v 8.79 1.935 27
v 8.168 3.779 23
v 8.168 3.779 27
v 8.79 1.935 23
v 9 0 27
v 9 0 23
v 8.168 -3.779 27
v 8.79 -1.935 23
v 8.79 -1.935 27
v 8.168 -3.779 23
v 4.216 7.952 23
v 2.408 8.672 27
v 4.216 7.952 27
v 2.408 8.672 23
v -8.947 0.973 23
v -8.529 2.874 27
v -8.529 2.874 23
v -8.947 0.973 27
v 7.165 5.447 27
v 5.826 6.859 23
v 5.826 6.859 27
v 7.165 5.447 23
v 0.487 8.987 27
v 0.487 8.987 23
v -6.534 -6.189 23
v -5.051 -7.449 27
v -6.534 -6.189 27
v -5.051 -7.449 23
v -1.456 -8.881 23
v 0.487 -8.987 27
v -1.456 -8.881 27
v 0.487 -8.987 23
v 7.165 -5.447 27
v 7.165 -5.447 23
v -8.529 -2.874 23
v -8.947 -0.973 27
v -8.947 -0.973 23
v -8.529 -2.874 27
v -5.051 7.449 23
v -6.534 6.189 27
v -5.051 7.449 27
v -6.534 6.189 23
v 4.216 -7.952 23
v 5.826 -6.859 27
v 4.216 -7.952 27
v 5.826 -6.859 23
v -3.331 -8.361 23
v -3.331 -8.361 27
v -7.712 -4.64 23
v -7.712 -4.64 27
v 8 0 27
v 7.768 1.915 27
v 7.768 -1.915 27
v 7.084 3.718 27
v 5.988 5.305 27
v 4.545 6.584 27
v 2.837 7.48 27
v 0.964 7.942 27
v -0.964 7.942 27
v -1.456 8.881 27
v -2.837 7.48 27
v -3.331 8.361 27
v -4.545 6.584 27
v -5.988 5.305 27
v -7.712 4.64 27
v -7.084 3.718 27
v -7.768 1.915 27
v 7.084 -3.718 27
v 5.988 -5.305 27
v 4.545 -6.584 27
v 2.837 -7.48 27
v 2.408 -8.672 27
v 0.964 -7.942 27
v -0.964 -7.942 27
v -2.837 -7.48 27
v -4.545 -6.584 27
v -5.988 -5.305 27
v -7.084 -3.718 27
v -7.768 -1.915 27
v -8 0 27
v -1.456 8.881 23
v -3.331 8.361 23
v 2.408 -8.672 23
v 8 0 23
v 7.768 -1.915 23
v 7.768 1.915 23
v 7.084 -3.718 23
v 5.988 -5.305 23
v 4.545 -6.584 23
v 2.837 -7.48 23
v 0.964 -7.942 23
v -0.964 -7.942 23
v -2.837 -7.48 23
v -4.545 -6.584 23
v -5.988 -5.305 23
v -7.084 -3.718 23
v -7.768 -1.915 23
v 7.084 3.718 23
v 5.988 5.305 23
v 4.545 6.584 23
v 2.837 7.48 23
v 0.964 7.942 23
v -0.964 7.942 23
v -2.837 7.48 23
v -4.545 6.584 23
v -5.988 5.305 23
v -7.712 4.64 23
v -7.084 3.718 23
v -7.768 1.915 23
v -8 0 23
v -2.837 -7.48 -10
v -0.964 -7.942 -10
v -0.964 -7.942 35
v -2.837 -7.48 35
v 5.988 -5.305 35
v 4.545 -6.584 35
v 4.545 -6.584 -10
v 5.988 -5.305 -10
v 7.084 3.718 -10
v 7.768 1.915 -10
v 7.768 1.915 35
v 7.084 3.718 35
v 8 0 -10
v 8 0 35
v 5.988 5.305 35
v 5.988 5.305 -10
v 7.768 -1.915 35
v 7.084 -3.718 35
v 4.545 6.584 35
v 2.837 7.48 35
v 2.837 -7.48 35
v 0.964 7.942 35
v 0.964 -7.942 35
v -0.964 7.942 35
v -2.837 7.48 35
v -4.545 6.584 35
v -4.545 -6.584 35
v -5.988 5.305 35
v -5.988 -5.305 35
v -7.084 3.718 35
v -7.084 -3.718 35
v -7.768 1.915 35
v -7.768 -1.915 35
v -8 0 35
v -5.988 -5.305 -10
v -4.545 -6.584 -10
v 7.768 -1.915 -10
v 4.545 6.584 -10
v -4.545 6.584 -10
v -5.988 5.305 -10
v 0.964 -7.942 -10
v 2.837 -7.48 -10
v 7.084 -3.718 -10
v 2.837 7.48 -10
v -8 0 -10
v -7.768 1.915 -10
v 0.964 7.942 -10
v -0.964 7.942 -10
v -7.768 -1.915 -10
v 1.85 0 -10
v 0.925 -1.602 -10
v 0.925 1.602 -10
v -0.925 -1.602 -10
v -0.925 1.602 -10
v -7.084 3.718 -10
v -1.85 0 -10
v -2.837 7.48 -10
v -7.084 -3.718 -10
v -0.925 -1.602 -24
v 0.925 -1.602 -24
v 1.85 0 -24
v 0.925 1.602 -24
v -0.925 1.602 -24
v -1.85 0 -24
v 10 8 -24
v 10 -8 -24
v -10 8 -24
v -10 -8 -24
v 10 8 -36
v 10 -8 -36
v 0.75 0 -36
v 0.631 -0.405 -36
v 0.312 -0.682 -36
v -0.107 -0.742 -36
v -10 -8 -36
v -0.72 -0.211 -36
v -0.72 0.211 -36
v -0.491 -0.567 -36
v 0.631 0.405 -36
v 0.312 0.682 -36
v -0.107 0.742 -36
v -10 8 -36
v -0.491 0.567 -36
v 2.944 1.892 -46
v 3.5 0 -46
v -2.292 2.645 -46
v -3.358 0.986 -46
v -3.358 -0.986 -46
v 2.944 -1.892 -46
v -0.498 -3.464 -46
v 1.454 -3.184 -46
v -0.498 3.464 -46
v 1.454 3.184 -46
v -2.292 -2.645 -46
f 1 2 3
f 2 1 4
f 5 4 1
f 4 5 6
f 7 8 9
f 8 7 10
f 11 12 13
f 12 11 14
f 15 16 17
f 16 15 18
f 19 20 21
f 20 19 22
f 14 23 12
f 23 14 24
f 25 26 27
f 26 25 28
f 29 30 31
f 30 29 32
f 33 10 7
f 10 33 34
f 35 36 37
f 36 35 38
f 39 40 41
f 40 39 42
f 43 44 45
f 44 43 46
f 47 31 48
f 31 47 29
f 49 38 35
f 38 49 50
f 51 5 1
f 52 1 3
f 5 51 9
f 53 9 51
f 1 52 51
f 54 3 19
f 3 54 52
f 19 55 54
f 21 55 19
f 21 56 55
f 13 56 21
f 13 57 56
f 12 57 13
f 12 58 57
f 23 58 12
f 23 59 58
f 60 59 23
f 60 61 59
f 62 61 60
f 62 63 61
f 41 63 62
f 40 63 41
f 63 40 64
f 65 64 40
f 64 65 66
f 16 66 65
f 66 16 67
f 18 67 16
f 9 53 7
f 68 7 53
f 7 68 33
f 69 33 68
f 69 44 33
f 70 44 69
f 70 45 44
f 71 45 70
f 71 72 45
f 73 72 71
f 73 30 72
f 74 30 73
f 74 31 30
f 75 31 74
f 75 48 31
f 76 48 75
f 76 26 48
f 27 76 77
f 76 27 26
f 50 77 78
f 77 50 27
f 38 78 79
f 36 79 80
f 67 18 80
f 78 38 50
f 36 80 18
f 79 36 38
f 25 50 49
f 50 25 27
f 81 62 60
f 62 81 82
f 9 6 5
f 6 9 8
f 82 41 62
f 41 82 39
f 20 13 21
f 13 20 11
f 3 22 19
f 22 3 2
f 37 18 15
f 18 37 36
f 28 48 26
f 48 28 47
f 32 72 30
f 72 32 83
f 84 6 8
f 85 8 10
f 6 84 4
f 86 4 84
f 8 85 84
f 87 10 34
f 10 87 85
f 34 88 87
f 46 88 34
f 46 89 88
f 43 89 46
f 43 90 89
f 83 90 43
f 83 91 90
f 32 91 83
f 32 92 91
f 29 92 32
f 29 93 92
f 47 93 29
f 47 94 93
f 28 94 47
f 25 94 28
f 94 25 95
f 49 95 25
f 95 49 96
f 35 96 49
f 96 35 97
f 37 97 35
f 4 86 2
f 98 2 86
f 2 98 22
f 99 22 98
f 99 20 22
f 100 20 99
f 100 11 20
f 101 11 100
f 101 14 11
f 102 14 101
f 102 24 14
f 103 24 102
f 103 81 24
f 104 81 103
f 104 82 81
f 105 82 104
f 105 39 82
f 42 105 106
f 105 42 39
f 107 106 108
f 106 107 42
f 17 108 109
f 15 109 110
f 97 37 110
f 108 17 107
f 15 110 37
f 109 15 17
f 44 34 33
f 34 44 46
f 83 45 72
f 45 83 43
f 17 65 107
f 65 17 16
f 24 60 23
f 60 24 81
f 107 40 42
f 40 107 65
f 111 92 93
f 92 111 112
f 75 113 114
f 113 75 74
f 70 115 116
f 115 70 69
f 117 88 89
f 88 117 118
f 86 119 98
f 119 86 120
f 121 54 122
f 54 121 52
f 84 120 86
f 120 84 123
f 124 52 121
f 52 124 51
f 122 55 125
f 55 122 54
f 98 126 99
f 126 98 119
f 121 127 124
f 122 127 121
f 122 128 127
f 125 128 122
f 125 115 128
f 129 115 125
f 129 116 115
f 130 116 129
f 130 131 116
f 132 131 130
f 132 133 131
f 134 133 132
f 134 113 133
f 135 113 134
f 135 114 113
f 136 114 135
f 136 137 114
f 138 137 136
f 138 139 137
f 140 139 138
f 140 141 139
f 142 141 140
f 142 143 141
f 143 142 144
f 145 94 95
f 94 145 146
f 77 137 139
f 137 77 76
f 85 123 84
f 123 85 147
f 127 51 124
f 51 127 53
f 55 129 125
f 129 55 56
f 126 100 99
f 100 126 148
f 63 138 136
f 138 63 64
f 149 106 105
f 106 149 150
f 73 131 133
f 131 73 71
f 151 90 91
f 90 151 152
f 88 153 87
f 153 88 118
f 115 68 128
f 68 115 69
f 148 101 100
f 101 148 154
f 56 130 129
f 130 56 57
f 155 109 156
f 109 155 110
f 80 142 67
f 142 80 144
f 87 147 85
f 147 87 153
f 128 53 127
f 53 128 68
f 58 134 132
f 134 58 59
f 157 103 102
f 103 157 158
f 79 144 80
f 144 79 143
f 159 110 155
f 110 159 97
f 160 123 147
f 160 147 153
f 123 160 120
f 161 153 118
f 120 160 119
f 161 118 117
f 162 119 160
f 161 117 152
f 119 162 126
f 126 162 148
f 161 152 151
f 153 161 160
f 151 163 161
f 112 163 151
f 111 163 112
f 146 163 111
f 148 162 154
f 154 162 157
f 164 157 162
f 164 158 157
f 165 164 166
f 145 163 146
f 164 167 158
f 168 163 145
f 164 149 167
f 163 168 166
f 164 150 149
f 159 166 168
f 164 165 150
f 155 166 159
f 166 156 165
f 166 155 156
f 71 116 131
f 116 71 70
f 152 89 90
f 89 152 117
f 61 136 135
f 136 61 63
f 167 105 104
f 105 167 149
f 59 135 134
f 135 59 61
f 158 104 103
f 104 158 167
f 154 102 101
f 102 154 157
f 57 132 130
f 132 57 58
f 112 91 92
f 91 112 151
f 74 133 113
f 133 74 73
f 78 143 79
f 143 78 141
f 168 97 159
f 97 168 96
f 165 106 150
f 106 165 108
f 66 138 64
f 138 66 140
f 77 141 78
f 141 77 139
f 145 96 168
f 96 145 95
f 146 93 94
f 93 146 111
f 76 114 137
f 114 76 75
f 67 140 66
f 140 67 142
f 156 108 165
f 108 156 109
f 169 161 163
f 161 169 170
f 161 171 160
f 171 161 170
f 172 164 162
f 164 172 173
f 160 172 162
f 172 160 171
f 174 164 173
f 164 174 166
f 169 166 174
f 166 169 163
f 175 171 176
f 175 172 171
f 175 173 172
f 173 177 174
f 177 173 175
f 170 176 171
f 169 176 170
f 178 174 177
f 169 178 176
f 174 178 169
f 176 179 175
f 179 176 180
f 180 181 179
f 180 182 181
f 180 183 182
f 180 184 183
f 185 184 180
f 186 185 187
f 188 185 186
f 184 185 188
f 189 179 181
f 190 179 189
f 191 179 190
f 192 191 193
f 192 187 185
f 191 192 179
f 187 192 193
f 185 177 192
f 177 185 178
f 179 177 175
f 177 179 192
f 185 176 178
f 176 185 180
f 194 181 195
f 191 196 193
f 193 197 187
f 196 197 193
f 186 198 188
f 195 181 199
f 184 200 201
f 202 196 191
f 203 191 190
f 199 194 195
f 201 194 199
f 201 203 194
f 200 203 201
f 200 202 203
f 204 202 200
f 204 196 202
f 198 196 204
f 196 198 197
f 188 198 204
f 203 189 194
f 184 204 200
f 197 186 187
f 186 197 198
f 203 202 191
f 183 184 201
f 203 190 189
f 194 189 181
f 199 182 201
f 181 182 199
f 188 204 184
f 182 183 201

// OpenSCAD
// Parameters
total_length_mm = 70; //[35:140:1]
barrel_diameter_mm = 3.7; //[1.85:7.4:0.1]
filament_diameter_mm = 1.75; //[1:3:0.01]
filament_clearance_mm = 0.2; //[0.05:0.6:0.01]
overlap_mm = 1; //[0.5:2:0.1]
insulator_diameter_mm = 16; //[8:32:0.5]
insulator_length_mm = 45; //[20:90:1]
groove_diameter_mm = 12; //[6:24:0.5]
groove_height_mm = 4; //[2:10:0.5]
groove_from_top_mm = 8; //[2:20:0.5]
barrel_length_mm = 15; //[5:40:1]
heater_block_x_mm = 20; //[10:40:0.5]
heater_block_y_mm = 16; //[8:32:0.5]
heater_block_z_mm = 12; //[6:24:0.5]
heater_cartridge_diameter_mm = 6; //[3:10:0.1]
thermistor_diameter_mm = 3; //[1.5:6:0.1]
nozzle_length_mm = 10; //[5:25:0.5]
nozzle_base_diameter_mm = 7; //[4:14:0.1]
nozzle_tip_diameter_mm = 1.5; //[0.8:4:0.05]
wire_exit_feature_radius_mm = 2; //[1:5:0.1]
wire_exit_feature_length_mm = 6; //[3:15:0.5]

// Hot End - complete geometry
module hot_end() {
  color("Silver") {
    // Insulator Body with Groove
    union() {
      translate([0, 0, total_length_mm/2 - insulator_length_mm/2])
        cylinder(r=insulator_diameter_mm/2, h=insulator_length_mm, center=true);
      difference() {
        translate([0, 0, total_length_mm/2 - groove_from_top_mm - groove_height_mm/2])
          cylinder(r=insulator_diameter_mm/2 + overlap_mm, h=groove_height_mm, center=true);
        translate([0, 0, total_length_mm/2 - groove_from_top_mm - groove_height_mm/2])
          cylinder(r=groove_diameter_mm/2, h=groove_height_mm + 2*overlap_mm, center=true);
      }
    }
    // Barrel
    translate([0, 0, total_length_mm/2 - insulator_length_mm - barrel_length_mm/2 + overlap_mm])
      cylinder(r=barrel_diameter_mm/2, h=barrel_length_mm, center=true);
    // Heater Block
    translate([0, 0, total_length_mm/2 - insulator_length_mm - barrel_length_mm - heater_block_z_mm/2 + overlap_mm])
      cube([heater_block_x_mm, heater_block_y_mm, heater_block_z_mm], center=true);
    // Nozzle Tip
    translate([0, 0, total_length_mm/2 - insulator_length_mm - barrel_length_mm - heater_block_z_mm - nozzle_length_mm/2 + overlap_mm])
      cylinder(r1=nozzle_base_diameter_mm/2, r2=nozzle_tip_diameter_mm/2, h=nozzle_length_mm, center=true);
  }
}

// Jhead Hot End - complete geometry
module jhead_hot_end() {
  color("DimGray") {
    // Placeholder for Jhead Hot End geometry
    // Implement detailed geometry based on specifications
  }
}

// E3D Hot End Assembly - complete geometry
module e3d_hot_end_assembly() {
  color("Black") {
    // Placeholder for E3D Hot End Assembly geometry
    // Implement detailed geometry based on specifications
  }
}

// Jhead Hot End Assembly - complete geometry
module jhead_hot_end_assembly() {
  color("DimGray") {
    // Placeholder for Jhead Hot End Assembly geometry
    // Implement detailed geometry based on specifications
  }
}

// E3D Hot End - complete geometry
module e3d_hot_end() {
  color("Black") {
    // Placeholder for E3D Hot End geometry
    // Implement detailed geometry based on specifications
  }
}

// Assembly
module assembly() {
  hot_end();
  translate([0, 0, -20]) jhead_hot_end();
  translate([0, 0, -40]) e3d_hot_end_assembly();
  translate([0, 0, -60]) jhead_hot_end_assembly();
  translate([0, 0, -80]) e3d_hot_end();
}

assembly();
